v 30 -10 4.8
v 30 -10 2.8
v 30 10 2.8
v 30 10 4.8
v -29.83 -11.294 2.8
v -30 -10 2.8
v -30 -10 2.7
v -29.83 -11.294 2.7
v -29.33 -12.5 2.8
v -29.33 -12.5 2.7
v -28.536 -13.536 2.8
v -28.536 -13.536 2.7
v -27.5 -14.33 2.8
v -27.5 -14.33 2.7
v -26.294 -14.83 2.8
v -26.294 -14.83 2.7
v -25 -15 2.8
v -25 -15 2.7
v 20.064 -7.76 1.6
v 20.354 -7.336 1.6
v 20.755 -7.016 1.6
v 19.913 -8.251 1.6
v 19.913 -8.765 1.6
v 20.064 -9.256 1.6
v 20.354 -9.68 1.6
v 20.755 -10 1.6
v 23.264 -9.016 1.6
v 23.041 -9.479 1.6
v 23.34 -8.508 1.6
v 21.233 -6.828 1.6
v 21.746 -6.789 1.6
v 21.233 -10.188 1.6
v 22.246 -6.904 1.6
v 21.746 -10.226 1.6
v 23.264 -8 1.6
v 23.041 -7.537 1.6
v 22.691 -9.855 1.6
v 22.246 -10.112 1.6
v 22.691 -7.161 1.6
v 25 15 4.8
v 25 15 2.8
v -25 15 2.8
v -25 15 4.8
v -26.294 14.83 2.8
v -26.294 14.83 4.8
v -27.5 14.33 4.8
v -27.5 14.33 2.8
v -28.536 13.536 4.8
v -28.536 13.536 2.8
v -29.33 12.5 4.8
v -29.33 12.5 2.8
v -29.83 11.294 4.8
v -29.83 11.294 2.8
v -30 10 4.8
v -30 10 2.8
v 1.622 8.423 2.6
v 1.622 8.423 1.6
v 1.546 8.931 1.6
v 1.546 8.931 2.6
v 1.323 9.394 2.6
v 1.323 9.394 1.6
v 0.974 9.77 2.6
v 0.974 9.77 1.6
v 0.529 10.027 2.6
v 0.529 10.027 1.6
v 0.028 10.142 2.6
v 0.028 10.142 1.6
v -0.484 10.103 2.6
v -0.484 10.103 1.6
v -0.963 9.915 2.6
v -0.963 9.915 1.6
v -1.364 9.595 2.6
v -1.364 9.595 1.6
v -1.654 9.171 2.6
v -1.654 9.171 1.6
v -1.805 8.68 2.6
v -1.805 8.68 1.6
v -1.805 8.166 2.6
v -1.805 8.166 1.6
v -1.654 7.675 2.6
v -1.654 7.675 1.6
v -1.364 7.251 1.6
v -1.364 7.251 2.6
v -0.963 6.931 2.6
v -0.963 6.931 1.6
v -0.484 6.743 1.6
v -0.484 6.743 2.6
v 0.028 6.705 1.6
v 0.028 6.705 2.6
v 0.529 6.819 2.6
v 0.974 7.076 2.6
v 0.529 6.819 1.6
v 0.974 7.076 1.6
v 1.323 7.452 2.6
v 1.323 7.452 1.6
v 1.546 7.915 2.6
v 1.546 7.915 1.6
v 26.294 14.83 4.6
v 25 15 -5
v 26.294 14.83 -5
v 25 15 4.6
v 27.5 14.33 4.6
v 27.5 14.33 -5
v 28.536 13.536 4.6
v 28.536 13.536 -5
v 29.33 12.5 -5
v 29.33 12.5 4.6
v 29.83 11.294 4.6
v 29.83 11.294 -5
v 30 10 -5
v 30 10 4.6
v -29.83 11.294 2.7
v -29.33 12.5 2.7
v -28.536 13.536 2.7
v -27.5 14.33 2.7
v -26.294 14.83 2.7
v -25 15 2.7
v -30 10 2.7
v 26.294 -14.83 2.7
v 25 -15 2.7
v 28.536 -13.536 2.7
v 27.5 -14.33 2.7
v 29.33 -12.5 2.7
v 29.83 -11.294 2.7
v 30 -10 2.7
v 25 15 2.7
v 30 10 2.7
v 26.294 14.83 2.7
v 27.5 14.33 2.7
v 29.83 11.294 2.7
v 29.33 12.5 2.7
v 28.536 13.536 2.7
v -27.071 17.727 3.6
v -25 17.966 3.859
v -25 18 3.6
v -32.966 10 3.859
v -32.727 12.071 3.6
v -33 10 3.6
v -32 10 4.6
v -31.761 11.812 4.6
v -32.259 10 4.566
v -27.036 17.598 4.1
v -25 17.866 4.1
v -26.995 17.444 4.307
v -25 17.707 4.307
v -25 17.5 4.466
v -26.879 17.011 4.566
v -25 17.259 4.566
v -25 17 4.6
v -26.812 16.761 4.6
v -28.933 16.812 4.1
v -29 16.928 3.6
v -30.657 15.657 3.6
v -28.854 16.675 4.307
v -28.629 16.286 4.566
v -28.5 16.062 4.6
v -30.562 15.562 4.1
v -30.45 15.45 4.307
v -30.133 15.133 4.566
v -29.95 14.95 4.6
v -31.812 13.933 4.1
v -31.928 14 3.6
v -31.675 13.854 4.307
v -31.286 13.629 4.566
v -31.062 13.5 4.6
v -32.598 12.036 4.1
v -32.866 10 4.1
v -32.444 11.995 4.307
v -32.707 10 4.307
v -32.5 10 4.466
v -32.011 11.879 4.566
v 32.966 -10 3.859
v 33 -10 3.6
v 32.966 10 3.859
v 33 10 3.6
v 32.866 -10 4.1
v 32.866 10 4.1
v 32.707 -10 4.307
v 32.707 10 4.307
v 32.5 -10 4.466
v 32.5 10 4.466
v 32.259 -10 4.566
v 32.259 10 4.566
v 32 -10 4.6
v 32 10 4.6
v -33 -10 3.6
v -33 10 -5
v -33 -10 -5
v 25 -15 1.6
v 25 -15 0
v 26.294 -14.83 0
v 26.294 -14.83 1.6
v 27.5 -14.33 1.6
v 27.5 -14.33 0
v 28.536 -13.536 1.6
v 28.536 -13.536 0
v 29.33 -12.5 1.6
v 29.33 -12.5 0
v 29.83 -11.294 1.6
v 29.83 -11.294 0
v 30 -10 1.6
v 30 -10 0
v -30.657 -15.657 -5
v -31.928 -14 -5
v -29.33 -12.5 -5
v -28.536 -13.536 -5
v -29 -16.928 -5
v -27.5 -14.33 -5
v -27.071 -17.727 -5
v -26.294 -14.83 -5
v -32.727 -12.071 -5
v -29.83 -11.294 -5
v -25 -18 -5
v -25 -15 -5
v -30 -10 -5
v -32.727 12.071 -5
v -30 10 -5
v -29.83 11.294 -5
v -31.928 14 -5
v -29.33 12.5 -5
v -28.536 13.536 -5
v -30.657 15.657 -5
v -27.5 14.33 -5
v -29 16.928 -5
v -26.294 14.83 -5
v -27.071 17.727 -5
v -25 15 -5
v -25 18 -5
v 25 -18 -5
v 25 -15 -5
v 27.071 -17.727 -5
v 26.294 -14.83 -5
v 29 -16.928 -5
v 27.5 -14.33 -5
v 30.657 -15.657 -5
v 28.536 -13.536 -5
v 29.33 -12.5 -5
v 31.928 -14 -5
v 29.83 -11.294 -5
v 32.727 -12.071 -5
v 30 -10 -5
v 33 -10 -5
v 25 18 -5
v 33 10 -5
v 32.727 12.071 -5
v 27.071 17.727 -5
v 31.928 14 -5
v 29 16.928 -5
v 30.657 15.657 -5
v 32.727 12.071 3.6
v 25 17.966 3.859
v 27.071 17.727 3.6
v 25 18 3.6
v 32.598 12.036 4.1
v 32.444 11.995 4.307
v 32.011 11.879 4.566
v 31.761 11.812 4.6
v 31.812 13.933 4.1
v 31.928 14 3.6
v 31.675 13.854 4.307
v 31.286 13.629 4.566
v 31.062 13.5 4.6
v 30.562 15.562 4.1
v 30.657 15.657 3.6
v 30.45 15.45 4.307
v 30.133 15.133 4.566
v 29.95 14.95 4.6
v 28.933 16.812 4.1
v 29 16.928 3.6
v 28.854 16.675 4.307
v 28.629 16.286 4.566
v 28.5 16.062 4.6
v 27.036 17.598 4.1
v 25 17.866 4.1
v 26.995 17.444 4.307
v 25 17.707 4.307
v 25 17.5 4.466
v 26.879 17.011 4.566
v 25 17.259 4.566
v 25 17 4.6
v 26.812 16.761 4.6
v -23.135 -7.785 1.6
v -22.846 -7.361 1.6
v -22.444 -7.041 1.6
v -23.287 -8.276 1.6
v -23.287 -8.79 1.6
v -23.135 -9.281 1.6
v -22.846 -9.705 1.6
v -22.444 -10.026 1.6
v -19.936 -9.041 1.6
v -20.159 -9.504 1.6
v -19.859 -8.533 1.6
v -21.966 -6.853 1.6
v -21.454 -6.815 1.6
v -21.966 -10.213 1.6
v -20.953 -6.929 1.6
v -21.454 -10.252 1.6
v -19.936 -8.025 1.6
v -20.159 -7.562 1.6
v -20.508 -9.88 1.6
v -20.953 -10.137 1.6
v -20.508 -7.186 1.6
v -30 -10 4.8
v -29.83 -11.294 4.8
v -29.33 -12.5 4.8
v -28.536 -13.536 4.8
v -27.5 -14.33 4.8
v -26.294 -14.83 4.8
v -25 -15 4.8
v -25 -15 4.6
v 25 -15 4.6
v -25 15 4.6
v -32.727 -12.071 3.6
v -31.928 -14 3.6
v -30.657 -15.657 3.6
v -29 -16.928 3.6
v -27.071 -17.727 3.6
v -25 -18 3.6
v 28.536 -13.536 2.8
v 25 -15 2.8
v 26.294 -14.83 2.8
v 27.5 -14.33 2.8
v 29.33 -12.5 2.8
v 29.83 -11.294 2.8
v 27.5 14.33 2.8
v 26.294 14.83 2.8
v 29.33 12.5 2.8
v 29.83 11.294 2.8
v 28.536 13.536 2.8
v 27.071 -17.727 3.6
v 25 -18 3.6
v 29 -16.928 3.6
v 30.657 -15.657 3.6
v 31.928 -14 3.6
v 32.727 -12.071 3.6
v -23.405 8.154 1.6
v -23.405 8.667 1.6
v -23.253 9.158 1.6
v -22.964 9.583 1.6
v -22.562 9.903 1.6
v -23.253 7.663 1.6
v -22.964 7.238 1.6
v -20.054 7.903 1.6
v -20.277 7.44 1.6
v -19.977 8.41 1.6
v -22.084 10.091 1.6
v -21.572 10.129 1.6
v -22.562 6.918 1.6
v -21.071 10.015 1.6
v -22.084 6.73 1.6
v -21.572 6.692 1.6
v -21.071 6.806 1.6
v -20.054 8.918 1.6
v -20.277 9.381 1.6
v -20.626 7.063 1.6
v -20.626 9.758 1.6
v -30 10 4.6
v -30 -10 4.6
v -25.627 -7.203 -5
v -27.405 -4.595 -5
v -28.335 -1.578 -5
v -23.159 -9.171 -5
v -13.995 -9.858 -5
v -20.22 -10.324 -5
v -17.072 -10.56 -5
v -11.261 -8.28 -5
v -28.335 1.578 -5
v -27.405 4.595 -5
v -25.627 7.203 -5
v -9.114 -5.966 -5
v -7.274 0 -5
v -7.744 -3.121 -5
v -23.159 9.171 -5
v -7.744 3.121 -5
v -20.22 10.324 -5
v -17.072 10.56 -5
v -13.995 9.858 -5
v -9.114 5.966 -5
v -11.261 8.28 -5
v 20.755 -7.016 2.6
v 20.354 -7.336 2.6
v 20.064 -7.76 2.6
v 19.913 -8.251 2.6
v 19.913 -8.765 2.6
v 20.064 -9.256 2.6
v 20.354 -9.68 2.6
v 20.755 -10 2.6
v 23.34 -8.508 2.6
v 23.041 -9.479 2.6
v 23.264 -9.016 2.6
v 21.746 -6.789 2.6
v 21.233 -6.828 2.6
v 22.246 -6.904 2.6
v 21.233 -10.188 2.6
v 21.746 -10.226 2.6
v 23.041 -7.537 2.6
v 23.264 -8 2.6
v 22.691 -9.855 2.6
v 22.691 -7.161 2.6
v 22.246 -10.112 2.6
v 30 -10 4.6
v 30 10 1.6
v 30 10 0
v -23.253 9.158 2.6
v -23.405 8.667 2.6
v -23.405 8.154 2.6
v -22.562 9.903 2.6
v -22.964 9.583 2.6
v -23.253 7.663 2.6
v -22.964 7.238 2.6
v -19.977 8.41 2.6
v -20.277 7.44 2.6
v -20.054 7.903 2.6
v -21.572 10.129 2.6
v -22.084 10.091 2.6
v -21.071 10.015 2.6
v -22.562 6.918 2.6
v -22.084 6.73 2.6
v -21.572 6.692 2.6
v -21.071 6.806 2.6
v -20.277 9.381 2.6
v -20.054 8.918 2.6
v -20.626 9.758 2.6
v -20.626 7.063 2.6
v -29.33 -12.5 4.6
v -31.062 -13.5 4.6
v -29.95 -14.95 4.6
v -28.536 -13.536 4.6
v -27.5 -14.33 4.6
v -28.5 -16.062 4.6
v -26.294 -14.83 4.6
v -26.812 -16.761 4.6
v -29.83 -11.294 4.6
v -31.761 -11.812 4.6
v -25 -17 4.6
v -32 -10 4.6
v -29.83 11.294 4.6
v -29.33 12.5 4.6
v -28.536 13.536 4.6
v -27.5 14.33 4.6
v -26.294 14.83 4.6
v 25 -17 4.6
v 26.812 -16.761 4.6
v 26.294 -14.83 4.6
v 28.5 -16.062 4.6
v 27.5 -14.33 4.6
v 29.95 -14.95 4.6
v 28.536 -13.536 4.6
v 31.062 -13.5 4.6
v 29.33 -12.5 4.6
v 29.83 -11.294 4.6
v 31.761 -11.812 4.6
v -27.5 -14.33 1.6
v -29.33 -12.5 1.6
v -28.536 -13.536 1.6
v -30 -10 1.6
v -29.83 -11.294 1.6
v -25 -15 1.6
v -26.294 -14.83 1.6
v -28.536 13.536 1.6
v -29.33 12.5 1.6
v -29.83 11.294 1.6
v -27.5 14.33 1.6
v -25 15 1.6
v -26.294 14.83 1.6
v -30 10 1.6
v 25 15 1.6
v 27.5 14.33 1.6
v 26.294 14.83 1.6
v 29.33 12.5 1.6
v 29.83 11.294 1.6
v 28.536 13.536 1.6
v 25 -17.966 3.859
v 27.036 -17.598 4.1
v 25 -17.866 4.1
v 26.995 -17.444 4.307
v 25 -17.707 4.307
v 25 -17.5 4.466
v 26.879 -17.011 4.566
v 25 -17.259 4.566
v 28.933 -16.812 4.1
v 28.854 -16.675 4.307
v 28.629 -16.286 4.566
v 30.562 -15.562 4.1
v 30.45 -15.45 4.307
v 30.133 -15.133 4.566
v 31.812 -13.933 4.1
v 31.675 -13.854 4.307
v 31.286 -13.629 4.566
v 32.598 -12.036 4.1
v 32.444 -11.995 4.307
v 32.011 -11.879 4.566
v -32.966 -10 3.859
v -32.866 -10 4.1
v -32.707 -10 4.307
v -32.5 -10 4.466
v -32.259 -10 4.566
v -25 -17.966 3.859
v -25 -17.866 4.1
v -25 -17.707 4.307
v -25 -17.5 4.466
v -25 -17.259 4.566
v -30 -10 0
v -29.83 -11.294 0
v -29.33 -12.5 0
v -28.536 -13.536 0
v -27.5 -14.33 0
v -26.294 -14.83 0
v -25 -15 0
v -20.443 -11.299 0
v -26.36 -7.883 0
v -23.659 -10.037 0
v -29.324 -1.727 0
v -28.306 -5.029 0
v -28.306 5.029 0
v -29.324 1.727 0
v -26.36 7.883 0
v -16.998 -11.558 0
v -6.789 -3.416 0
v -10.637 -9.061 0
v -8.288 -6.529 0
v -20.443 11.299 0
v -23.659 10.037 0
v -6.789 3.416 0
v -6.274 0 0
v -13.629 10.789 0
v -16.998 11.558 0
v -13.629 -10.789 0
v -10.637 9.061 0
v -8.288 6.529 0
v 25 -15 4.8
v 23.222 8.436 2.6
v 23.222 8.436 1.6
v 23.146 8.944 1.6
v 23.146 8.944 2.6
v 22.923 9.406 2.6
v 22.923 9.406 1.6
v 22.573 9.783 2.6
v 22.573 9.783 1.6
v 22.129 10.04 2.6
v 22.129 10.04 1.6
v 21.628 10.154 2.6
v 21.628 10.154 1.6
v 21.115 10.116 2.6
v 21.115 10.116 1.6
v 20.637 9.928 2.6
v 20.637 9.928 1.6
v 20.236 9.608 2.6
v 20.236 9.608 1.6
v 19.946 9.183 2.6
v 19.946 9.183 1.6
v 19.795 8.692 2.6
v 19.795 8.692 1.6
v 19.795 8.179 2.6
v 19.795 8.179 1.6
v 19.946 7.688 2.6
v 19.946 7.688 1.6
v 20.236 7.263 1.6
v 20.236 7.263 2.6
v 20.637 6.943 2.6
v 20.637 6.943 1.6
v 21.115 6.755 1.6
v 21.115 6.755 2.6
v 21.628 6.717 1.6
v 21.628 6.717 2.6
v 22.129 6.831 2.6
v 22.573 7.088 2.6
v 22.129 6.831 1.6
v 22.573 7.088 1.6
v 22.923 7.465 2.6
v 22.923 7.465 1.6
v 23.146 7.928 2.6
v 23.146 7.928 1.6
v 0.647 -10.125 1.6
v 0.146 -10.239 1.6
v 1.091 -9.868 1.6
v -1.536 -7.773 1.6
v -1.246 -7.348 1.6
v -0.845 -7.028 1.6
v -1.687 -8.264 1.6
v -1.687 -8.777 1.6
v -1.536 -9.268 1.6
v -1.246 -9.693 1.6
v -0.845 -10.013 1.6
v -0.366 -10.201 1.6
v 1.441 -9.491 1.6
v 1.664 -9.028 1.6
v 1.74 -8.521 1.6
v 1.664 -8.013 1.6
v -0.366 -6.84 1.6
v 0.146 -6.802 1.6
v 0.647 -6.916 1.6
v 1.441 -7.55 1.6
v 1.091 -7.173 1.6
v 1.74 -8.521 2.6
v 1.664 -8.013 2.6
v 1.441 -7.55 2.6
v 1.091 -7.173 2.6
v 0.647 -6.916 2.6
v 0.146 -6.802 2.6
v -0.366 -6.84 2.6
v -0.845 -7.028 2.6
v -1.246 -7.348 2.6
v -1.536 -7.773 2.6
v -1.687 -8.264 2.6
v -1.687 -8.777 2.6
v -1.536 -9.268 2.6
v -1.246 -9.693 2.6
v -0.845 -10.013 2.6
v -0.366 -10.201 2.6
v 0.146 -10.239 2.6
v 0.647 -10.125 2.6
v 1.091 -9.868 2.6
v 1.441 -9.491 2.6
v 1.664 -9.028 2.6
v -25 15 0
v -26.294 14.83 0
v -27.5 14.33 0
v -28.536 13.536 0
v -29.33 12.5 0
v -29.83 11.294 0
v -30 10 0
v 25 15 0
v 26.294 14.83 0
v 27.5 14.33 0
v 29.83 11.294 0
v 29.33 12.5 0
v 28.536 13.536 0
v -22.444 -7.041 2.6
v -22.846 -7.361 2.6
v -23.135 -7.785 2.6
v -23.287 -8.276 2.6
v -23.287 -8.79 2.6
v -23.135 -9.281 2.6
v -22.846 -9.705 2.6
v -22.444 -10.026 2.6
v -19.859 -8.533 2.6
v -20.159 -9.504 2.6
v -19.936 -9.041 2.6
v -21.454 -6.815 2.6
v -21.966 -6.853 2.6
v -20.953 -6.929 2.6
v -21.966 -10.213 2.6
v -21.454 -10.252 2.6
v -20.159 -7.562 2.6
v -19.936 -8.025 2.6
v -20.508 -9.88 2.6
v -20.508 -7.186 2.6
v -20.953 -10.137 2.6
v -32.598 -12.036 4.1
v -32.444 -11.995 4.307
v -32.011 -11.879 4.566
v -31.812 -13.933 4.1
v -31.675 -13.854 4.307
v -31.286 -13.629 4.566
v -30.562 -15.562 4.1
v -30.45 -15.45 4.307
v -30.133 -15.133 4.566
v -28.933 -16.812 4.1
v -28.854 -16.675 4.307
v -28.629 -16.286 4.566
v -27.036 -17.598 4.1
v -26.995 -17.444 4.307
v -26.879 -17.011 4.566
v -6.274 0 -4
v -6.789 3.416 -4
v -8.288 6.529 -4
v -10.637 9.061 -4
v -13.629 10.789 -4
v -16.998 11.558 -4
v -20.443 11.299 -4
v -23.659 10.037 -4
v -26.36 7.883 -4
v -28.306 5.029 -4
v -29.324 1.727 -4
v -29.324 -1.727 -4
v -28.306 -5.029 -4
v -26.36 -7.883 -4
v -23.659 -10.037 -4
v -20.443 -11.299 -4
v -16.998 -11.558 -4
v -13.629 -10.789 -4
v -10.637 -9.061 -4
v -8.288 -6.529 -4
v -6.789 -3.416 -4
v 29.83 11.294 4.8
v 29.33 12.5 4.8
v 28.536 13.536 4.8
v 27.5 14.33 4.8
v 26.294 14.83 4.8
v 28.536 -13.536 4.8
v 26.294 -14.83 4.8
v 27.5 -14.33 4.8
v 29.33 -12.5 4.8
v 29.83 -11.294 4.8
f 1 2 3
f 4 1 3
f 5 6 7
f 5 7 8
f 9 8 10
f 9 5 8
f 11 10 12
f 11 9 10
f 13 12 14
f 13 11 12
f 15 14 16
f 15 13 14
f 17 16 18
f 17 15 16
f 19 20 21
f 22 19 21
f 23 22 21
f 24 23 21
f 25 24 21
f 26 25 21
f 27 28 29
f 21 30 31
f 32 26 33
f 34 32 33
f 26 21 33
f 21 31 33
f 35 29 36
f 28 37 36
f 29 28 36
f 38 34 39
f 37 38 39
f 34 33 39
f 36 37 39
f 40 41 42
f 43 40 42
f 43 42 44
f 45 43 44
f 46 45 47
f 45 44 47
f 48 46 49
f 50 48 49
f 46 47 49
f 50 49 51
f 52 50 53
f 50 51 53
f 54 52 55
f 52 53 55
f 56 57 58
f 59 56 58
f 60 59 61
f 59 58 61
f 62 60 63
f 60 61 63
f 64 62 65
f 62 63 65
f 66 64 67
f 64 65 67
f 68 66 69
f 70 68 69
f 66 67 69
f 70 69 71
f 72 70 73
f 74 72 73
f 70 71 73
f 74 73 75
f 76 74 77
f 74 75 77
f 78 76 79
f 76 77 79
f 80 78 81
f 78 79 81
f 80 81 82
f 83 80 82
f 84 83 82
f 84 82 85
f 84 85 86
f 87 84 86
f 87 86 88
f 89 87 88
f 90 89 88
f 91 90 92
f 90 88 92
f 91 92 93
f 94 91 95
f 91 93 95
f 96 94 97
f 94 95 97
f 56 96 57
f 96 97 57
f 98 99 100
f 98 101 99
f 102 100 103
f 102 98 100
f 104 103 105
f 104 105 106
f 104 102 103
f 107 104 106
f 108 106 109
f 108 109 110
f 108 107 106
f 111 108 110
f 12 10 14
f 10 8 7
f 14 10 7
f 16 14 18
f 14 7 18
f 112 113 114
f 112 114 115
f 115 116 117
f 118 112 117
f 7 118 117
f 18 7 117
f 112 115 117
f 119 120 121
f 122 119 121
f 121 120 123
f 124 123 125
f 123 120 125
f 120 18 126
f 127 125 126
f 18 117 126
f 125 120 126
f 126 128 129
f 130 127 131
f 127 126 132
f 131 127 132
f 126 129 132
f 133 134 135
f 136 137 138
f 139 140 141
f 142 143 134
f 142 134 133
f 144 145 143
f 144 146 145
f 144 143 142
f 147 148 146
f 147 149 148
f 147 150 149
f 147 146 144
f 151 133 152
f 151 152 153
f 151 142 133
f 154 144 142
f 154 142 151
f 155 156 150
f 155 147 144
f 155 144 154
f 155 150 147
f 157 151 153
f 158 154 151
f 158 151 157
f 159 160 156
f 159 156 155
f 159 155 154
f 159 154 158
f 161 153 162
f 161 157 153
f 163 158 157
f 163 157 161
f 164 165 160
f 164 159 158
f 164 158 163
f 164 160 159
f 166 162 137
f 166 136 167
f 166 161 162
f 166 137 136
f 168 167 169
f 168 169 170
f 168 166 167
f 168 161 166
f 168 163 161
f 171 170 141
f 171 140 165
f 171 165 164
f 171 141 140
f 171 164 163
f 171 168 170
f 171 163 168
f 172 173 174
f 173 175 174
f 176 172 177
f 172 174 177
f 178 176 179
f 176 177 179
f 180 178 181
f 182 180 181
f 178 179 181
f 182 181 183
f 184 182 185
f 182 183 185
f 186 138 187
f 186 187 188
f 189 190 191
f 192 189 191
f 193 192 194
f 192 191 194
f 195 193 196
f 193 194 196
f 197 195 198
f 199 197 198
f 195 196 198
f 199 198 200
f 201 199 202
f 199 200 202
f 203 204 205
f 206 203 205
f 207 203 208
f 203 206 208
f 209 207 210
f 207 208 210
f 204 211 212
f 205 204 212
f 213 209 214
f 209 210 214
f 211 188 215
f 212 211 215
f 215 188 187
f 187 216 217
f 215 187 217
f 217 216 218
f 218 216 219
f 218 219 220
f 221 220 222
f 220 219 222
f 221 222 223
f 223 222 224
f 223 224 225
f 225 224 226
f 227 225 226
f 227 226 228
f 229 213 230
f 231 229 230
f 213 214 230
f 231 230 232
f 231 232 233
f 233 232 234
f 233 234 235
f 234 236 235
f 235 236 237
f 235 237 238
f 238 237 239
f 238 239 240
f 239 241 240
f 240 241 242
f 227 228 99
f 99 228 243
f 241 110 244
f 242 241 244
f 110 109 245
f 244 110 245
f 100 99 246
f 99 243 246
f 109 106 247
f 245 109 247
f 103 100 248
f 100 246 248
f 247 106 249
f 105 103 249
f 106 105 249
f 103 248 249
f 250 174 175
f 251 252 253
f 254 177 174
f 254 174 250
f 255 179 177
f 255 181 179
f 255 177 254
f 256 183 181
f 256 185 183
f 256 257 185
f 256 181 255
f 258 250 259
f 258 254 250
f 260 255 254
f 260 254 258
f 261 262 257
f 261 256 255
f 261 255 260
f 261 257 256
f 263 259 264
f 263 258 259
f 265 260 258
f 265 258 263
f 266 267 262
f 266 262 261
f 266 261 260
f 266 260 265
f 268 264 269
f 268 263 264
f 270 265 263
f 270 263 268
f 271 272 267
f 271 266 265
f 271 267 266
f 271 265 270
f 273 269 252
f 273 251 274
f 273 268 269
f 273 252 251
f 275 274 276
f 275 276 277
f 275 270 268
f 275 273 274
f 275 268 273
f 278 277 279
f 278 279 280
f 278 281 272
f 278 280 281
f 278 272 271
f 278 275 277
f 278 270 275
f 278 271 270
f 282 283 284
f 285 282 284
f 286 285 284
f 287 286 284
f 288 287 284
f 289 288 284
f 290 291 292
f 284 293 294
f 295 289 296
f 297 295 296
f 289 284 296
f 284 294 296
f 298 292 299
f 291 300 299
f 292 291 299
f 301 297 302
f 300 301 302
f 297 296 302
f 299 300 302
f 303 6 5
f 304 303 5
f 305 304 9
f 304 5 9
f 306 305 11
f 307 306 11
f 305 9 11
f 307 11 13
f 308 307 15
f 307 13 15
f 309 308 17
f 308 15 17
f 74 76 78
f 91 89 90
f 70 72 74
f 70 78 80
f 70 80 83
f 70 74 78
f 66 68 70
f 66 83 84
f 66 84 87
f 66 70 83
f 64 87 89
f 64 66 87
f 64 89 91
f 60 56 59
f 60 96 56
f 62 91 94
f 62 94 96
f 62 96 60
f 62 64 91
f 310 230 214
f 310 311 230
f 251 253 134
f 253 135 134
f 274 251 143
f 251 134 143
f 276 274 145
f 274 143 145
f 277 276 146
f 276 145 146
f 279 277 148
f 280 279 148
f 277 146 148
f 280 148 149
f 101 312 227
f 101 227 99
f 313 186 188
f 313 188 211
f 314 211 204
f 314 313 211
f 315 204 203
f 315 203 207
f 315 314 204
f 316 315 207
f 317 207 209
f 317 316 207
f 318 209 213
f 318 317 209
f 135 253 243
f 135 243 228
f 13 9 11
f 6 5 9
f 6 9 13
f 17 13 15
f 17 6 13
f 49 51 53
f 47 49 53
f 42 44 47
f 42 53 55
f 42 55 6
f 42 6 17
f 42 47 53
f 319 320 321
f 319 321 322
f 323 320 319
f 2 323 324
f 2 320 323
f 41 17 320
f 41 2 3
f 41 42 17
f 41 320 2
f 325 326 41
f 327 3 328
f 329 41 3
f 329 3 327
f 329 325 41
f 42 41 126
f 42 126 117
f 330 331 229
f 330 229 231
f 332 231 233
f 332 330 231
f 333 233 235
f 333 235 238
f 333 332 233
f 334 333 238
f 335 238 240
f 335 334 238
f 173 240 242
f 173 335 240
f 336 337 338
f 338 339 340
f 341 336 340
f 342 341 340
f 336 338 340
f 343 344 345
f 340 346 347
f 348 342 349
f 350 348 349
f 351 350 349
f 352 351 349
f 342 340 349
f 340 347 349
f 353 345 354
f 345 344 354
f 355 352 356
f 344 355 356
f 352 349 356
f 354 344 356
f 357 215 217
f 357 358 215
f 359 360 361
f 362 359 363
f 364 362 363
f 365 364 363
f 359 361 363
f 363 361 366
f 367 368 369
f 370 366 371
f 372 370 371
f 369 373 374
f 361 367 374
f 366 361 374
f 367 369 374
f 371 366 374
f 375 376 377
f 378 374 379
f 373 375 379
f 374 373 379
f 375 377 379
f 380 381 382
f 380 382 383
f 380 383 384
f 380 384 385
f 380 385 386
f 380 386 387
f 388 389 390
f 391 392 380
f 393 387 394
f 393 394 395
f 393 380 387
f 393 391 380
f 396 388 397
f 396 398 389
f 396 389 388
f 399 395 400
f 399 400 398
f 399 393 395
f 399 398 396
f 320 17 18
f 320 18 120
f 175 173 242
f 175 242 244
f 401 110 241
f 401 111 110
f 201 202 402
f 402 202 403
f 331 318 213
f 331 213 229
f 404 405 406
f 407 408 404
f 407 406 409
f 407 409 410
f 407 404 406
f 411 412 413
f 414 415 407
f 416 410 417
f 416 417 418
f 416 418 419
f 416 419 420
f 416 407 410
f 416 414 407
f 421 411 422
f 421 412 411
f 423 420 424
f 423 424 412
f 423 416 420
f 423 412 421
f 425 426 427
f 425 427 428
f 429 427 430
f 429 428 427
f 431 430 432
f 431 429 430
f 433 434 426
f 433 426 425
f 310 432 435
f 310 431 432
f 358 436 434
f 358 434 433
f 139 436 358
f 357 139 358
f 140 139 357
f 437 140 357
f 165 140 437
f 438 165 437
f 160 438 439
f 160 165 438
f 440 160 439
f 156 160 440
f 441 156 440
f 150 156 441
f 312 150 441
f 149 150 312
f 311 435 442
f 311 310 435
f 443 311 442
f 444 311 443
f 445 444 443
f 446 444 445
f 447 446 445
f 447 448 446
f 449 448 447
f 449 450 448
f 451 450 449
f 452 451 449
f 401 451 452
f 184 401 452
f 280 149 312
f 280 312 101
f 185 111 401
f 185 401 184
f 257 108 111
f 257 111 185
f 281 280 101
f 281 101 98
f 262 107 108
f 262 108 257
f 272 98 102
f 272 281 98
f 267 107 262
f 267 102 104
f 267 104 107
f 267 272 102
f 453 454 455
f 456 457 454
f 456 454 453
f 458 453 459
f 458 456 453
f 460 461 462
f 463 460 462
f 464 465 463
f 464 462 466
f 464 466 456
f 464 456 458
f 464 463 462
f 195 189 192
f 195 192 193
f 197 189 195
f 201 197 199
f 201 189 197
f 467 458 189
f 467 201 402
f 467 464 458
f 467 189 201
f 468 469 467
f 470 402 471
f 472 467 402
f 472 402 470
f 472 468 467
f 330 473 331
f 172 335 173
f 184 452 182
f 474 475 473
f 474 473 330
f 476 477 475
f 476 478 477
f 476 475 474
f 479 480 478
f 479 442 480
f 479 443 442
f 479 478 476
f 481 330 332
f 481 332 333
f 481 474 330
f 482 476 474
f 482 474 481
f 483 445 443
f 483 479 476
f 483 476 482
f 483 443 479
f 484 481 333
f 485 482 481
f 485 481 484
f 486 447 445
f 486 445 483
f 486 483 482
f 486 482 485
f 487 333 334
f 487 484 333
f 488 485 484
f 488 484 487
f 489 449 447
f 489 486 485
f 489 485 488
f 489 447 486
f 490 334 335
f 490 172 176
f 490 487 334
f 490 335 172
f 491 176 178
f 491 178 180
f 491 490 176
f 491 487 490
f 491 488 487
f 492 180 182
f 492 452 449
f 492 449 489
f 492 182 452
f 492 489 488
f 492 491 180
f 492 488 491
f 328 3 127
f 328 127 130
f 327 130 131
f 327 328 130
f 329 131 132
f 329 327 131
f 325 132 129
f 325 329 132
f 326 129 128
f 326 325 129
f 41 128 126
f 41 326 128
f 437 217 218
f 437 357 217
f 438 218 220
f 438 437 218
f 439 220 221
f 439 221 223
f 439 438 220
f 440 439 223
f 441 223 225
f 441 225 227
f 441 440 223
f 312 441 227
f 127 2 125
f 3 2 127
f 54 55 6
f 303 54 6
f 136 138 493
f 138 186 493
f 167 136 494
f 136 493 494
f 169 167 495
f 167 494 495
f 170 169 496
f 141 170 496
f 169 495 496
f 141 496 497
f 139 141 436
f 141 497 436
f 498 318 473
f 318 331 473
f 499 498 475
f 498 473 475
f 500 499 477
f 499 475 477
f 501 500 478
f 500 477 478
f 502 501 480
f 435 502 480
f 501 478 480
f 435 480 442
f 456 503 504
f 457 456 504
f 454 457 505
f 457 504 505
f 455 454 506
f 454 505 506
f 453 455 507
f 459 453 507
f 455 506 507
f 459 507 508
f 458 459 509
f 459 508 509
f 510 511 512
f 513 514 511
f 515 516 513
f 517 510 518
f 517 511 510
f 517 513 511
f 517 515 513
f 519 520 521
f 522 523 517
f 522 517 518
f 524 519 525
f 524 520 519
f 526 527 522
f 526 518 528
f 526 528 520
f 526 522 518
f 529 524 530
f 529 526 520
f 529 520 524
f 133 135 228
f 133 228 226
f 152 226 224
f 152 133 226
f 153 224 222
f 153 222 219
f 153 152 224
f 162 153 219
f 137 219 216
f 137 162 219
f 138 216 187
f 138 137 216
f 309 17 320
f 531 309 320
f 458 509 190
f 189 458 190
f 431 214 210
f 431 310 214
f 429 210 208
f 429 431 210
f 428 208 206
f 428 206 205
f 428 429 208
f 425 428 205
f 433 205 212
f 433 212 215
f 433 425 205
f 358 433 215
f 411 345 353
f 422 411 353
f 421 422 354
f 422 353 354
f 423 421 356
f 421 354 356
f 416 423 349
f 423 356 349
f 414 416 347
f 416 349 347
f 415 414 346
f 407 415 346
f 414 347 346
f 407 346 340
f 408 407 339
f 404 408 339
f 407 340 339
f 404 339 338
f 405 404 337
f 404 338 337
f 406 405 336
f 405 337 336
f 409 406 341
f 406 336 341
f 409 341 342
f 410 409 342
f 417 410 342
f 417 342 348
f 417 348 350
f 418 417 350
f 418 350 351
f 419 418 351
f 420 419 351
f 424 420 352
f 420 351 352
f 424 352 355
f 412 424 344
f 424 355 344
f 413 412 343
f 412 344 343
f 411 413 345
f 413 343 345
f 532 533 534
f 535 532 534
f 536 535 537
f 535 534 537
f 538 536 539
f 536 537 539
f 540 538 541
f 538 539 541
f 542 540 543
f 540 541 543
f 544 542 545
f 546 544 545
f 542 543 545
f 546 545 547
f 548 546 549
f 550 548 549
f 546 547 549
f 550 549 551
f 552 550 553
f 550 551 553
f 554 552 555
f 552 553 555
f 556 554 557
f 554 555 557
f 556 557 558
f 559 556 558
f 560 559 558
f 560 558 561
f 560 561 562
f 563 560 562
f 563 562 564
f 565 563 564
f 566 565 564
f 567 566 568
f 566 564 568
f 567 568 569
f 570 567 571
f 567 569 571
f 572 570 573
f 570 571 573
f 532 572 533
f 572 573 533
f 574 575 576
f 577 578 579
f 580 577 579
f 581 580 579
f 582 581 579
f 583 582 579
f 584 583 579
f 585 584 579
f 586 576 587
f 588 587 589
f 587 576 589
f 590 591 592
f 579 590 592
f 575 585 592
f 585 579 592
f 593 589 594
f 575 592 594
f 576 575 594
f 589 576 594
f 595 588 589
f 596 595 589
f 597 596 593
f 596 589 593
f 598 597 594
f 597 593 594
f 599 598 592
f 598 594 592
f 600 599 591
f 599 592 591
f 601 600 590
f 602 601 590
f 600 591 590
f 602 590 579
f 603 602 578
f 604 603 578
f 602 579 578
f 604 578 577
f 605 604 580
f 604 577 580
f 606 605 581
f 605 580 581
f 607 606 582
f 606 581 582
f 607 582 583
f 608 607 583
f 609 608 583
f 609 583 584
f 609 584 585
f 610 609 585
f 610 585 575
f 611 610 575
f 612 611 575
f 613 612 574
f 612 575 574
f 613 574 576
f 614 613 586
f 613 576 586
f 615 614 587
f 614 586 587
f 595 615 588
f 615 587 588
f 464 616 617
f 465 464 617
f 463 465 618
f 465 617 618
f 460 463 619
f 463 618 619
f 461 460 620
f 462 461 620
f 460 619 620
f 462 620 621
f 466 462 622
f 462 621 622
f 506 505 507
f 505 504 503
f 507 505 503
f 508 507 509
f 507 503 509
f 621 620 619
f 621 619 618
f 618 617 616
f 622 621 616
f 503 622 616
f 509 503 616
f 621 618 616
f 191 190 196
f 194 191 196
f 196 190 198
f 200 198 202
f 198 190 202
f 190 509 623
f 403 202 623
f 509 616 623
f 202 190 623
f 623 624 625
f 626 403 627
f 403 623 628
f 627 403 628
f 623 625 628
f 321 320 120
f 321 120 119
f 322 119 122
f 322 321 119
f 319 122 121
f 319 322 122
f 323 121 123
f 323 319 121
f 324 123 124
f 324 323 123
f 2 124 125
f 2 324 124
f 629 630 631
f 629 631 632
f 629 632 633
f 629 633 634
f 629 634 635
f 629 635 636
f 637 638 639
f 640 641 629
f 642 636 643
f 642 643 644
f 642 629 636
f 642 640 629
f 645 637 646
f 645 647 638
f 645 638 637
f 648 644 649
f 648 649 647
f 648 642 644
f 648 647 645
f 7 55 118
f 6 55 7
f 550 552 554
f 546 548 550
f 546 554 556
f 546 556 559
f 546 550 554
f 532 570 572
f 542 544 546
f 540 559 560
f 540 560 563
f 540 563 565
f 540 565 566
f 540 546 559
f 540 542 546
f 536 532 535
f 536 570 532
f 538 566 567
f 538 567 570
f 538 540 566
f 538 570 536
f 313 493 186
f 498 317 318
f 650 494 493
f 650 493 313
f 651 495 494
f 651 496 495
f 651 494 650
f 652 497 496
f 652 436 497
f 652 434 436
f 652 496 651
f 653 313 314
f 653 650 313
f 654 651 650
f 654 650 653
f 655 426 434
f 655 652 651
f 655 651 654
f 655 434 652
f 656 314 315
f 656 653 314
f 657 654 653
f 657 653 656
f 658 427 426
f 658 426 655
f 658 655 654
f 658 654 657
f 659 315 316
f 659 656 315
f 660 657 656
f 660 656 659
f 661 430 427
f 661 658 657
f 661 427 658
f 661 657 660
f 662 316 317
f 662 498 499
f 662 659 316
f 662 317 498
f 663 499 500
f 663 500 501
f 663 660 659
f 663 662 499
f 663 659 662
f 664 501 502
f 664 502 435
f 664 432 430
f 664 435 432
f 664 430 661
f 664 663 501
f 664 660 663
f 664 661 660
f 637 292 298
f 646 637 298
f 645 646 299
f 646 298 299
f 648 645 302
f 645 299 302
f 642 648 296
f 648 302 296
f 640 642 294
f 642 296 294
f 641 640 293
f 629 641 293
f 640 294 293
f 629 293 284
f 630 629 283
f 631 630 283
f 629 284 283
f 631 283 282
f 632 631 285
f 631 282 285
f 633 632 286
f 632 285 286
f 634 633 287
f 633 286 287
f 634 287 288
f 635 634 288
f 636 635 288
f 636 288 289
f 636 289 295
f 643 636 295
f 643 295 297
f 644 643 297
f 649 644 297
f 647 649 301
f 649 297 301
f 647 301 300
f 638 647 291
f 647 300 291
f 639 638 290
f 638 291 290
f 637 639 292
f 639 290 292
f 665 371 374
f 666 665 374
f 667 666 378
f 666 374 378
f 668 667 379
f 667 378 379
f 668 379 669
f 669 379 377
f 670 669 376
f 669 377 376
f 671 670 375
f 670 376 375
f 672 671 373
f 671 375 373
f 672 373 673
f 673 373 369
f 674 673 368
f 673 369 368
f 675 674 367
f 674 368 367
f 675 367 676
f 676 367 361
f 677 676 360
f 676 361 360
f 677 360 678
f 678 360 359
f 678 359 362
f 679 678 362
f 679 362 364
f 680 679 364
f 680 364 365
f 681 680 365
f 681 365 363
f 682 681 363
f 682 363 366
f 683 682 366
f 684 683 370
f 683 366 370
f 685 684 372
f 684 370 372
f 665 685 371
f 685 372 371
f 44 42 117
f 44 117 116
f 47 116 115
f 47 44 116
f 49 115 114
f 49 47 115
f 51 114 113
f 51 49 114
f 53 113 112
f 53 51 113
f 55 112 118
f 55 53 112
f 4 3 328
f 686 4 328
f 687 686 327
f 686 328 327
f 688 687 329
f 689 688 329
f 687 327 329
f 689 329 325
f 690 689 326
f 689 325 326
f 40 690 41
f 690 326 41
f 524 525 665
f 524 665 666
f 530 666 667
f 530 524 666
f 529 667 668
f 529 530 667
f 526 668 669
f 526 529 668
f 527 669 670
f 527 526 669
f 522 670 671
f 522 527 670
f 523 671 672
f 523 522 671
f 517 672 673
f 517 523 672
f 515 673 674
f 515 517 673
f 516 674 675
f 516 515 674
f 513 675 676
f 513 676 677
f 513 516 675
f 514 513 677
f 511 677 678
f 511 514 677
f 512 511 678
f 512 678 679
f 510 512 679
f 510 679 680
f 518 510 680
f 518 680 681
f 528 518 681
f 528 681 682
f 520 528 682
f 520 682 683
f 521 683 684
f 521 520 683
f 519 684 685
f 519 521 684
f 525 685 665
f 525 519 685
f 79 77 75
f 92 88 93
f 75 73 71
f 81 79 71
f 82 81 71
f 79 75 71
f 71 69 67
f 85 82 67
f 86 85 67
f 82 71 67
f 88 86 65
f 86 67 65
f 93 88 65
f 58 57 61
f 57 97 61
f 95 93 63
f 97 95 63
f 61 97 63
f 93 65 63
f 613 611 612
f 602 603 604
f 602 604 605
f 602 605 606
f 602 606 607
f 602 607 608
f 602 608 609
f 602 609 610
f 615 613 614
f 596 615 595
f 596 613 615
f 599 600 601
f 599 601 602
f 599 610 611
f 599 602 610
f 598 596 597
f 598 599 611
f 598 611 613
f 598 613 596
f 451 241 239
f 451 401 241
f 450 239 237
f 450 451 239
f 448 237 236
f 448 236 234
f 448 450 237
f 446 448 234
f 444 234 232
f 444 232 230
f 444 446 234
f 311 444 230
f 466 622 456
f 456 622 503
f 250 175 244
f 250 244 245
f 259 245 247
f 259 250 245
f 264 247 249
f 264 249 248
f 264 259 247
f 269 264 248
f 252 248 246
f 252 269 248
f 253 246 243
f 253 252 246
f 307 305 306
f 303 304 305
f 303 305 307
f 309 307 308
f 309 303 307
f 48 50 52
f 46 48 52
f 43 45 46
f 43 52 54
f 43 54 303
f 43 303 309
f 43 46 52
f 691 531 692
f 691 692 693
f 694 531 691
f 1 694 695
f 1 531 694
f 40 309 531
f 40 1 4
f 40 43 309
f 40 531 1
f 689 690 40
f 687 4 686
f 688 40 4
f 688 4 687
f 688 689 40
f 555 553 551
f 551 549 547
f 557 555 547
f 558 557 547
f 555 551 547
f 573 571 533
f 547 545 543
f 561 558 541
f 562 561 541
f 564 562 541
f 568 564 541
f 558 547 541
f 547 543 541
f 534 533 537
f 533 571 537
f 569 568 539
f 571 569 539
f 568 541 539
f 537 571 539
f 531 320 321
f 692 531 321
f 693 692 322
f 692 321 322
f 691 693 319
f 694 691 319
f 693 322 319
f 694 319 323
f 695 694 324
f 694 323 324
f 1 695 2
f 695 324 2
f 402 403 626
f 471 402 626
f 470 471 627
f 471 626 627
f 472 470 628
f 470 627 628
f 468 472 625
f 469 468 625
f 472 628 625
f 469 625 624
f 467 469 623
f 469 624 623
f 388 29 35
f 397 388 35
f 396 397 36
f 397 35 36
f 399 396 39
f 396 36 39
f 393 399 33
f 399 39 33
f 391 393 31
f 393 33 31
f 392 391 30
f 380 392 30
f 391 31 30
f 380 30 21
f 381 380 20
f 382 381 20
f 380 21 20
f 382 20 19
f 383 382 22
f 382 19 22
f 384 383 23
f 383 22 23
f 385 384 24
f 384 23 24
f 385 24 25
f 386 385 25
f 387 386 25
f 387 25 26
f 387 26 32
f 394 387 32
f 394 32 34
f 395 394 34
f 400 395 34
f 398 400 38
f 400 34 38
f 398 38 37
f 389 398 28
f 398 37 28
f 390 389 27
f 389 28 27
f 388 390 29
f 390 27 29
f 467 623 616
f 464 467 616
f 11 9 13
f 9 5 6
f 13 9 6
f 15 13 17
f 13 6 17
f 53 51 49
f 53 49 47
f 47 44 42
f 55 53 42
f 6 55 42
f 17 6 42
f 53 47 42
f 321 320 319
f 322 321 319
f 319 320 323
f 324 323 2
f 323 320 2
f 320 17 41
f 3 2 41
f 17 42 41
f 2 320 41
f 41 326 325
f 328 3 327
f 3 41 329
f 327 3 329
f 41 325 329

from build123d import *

# Parameters (mm, degrees)
F1_DEPTH      = 1.6
F2_DEPTH      = 3.2
F3_DEPTH      = 1.2
F4_DEPTH      = 4.6
F4_DEPTH_BACK = 5
F5_R          = 1
F6_R          = 11.5899094466
F7_DEPTH      = 5
F8_SIZE       = 1
F9_R          = 1.7233060419
F10_DEPTH     = 1
F11_DEPTH     = 0.1


with BuildPart() as f1:
    # F0 (on Top) → F1 (new body)
    with BuildSketch(Plane.XY):
        with BuildLine():
            ThreePointArc((30, 10), (28.5355339059, 13.5355339059), (25, 15))
            Line((25, 15), (-25, 15))
            ThreePointArc((-25, 15), (-28.5355339059, 13.5355339059), (-30, 10))
            Line((-30, 10), (-30, -10))
            ThreePointArc((-30, -10), (-28.5355339059, -13.5355339059), (-25, -15))
            Line((-25, -15), (25, -15))
            ThreePointArc((25, -15), (28.5355339059, -13.5355339059), (30, -10))
            Line((30, -10), (30, 10))
        make_face()
    extrude(amount=F1_DEPTH)


with BuildPart() as f2:
    # F2 (new): a face of the model
    f2_faces = [f1.part.faces().sort_by_distance(p)[0] for p in [
        (0, 0, 1.6),
    ]]
    extrude(f2_faces, amount=F2_DEPTH)

    # F3 (cut): a face of the model
    f3_faces = [f2.faces().sort_by_distance(p)[0] for p in [
        (0, 0, 1.6),
    ]]
    extrude(f3_faces, amount=-F3_DEPTH, mode=Mode.SUBTRACT)


with BuildPart() as f4:
    # F0 (on Top) → F4 (new body, two sides)
    with BuildSketch(Plane.XY) as f4_sk:
        with BuildLine():
            Line((33, -10), (33, 10))
            ThreePointArc((33, 10), (30.6568542495, 15.6568542495), (25, 18))
            Line((25, 18), (-25, 18))
            ThreePointArc((-25, 18), (-30.6568542495, 15.6568542495), (-33, 10))
            Line((-33, 10), (-33, -10))
            ThreePointArc((-33, -10), (-30.6568542495, -15.6568542495), (-25, -18))
            Line((-25, -18), (25, -18))
            ThreePointArc((25, -18), (30.6568542495, -15.6568542495), (33, -10))
        make_face()
        with BuildLine():
            Line((-25, 15), (25, 15))
            ThreePointArc((25, 15), (28.5355339059, 13.5355339059), (30, 10))
            Line((30, 10), (30, -10))
            ThreePointArc((30, -10), (28.5355339059, -13.5355339059), (25, -15))
            Line((25, -15), (-25, -15))
            ThreePointArc((-25, -15), (-28.5355339059, -13.5355339059), (-30, -10))
            Line((-30, -10), (-30, 10))
            ThreePointArc((-30, 10), (-28.5355339059, 13.5355339059), (-25, 15))
        make_face(mode=Mode.SUBTRACT)
    extrude(amount=F4_DEPTH)
    extrude(f4_sk.sketch, amount=-F4_DEPTH_BACK)

    # F5
    f5_edges = [f4.edges().sort_by_distance(p)[0] for p in [
        (33, 0, 4.6),
    ]]
    fillet(f5_edges, radius=F5_R)


with BuildPart() as f7:
    # F6 (on face) → F7 (new body)
    with BuildSketch(Plane.XY):
        with Locations((-17.8636480123, 0)):
            Circle(F6_R)
    extrude(amount=-F7_DEPTH)

    # F8
    f8_edges = [f7.edges().sort_by_distance(p)[0] for p in [
        (-29.453557, 0, -5),
    ]]
    chamfer(f8_edges, length=F8_SIZE)


with BuildPart() as f10:
    # F9 (on face) → F10 (new body)
    with BuildSketch(Plane.XY.offset(1.6)):
        with Locations((-21.7006991855, 8.4104844814)):
            Circle(F9_R)
    extrude(amount=F10_DEPTH)


with BuildPart() as f10b:
    # F9 (on face) → F10, piece 2 (new body)
    with BuildSketch(Plane.XY.offset(1.6)):
        with Locations((-0.1008850596, 8.4230364611)):
            Circle(F9_R)
    extrude(amount=F10_DEPTH)


with BuildPart() as f10c:
    # F9 (on face) → F10, piece 3 (new body)
    with BuildSketch(Plane.XY.offset(1.6)):
        with Locations((21.4989290663, 8.4355884408)):
            Circle(F9_R)
    extrude(amount=F10_DEPTH)


with BuildPart() as f10d:
    # F9 (on face) → F10, piece 4 (new body)
    with BuildSketch(Plane.XY.offset(1.6)):
        with Locations((-21.5827859859, -8.5330907029)):
            Circle(F9_R)
    extrude(amount=F10_DEPTH)


with BuildPart() as f10e:
    # F9 (on face) → F10, piece 5 (new body)
    with BuildSketch(Plane.XY.offset(1.6)):
        with Locations((0.01702814, -8.5205387232)):
            Circle(F9_R)
    extrude(amount=F10_DEPTH)


with BuildPart() as f10f:
    # F9 (on face) → F10, piece 6 (new body)
    with BuildSketch(Plane.XY.offset(1.6)):
        with Locations((21.6168422659, -8.5079867435)):
            Circle(F9_R)
    extrude(amount=F10_DEPTH)


with BuildPart() as f11:
    # F11 (new): a face of the model
    f11_faces = [f2.part.faces().sort_by_distance(p)[0] for p in [
        (0, 0, 2.8),
    ]]
    extrude(f11_faces, amount=F11_DEPTH)


solid = Compound([f1.part, f2.part, f4.part, f7.part, f10.part, f10b.part, f10c.part, f10d.part, f10e.part, f10f.part, f11.part])
